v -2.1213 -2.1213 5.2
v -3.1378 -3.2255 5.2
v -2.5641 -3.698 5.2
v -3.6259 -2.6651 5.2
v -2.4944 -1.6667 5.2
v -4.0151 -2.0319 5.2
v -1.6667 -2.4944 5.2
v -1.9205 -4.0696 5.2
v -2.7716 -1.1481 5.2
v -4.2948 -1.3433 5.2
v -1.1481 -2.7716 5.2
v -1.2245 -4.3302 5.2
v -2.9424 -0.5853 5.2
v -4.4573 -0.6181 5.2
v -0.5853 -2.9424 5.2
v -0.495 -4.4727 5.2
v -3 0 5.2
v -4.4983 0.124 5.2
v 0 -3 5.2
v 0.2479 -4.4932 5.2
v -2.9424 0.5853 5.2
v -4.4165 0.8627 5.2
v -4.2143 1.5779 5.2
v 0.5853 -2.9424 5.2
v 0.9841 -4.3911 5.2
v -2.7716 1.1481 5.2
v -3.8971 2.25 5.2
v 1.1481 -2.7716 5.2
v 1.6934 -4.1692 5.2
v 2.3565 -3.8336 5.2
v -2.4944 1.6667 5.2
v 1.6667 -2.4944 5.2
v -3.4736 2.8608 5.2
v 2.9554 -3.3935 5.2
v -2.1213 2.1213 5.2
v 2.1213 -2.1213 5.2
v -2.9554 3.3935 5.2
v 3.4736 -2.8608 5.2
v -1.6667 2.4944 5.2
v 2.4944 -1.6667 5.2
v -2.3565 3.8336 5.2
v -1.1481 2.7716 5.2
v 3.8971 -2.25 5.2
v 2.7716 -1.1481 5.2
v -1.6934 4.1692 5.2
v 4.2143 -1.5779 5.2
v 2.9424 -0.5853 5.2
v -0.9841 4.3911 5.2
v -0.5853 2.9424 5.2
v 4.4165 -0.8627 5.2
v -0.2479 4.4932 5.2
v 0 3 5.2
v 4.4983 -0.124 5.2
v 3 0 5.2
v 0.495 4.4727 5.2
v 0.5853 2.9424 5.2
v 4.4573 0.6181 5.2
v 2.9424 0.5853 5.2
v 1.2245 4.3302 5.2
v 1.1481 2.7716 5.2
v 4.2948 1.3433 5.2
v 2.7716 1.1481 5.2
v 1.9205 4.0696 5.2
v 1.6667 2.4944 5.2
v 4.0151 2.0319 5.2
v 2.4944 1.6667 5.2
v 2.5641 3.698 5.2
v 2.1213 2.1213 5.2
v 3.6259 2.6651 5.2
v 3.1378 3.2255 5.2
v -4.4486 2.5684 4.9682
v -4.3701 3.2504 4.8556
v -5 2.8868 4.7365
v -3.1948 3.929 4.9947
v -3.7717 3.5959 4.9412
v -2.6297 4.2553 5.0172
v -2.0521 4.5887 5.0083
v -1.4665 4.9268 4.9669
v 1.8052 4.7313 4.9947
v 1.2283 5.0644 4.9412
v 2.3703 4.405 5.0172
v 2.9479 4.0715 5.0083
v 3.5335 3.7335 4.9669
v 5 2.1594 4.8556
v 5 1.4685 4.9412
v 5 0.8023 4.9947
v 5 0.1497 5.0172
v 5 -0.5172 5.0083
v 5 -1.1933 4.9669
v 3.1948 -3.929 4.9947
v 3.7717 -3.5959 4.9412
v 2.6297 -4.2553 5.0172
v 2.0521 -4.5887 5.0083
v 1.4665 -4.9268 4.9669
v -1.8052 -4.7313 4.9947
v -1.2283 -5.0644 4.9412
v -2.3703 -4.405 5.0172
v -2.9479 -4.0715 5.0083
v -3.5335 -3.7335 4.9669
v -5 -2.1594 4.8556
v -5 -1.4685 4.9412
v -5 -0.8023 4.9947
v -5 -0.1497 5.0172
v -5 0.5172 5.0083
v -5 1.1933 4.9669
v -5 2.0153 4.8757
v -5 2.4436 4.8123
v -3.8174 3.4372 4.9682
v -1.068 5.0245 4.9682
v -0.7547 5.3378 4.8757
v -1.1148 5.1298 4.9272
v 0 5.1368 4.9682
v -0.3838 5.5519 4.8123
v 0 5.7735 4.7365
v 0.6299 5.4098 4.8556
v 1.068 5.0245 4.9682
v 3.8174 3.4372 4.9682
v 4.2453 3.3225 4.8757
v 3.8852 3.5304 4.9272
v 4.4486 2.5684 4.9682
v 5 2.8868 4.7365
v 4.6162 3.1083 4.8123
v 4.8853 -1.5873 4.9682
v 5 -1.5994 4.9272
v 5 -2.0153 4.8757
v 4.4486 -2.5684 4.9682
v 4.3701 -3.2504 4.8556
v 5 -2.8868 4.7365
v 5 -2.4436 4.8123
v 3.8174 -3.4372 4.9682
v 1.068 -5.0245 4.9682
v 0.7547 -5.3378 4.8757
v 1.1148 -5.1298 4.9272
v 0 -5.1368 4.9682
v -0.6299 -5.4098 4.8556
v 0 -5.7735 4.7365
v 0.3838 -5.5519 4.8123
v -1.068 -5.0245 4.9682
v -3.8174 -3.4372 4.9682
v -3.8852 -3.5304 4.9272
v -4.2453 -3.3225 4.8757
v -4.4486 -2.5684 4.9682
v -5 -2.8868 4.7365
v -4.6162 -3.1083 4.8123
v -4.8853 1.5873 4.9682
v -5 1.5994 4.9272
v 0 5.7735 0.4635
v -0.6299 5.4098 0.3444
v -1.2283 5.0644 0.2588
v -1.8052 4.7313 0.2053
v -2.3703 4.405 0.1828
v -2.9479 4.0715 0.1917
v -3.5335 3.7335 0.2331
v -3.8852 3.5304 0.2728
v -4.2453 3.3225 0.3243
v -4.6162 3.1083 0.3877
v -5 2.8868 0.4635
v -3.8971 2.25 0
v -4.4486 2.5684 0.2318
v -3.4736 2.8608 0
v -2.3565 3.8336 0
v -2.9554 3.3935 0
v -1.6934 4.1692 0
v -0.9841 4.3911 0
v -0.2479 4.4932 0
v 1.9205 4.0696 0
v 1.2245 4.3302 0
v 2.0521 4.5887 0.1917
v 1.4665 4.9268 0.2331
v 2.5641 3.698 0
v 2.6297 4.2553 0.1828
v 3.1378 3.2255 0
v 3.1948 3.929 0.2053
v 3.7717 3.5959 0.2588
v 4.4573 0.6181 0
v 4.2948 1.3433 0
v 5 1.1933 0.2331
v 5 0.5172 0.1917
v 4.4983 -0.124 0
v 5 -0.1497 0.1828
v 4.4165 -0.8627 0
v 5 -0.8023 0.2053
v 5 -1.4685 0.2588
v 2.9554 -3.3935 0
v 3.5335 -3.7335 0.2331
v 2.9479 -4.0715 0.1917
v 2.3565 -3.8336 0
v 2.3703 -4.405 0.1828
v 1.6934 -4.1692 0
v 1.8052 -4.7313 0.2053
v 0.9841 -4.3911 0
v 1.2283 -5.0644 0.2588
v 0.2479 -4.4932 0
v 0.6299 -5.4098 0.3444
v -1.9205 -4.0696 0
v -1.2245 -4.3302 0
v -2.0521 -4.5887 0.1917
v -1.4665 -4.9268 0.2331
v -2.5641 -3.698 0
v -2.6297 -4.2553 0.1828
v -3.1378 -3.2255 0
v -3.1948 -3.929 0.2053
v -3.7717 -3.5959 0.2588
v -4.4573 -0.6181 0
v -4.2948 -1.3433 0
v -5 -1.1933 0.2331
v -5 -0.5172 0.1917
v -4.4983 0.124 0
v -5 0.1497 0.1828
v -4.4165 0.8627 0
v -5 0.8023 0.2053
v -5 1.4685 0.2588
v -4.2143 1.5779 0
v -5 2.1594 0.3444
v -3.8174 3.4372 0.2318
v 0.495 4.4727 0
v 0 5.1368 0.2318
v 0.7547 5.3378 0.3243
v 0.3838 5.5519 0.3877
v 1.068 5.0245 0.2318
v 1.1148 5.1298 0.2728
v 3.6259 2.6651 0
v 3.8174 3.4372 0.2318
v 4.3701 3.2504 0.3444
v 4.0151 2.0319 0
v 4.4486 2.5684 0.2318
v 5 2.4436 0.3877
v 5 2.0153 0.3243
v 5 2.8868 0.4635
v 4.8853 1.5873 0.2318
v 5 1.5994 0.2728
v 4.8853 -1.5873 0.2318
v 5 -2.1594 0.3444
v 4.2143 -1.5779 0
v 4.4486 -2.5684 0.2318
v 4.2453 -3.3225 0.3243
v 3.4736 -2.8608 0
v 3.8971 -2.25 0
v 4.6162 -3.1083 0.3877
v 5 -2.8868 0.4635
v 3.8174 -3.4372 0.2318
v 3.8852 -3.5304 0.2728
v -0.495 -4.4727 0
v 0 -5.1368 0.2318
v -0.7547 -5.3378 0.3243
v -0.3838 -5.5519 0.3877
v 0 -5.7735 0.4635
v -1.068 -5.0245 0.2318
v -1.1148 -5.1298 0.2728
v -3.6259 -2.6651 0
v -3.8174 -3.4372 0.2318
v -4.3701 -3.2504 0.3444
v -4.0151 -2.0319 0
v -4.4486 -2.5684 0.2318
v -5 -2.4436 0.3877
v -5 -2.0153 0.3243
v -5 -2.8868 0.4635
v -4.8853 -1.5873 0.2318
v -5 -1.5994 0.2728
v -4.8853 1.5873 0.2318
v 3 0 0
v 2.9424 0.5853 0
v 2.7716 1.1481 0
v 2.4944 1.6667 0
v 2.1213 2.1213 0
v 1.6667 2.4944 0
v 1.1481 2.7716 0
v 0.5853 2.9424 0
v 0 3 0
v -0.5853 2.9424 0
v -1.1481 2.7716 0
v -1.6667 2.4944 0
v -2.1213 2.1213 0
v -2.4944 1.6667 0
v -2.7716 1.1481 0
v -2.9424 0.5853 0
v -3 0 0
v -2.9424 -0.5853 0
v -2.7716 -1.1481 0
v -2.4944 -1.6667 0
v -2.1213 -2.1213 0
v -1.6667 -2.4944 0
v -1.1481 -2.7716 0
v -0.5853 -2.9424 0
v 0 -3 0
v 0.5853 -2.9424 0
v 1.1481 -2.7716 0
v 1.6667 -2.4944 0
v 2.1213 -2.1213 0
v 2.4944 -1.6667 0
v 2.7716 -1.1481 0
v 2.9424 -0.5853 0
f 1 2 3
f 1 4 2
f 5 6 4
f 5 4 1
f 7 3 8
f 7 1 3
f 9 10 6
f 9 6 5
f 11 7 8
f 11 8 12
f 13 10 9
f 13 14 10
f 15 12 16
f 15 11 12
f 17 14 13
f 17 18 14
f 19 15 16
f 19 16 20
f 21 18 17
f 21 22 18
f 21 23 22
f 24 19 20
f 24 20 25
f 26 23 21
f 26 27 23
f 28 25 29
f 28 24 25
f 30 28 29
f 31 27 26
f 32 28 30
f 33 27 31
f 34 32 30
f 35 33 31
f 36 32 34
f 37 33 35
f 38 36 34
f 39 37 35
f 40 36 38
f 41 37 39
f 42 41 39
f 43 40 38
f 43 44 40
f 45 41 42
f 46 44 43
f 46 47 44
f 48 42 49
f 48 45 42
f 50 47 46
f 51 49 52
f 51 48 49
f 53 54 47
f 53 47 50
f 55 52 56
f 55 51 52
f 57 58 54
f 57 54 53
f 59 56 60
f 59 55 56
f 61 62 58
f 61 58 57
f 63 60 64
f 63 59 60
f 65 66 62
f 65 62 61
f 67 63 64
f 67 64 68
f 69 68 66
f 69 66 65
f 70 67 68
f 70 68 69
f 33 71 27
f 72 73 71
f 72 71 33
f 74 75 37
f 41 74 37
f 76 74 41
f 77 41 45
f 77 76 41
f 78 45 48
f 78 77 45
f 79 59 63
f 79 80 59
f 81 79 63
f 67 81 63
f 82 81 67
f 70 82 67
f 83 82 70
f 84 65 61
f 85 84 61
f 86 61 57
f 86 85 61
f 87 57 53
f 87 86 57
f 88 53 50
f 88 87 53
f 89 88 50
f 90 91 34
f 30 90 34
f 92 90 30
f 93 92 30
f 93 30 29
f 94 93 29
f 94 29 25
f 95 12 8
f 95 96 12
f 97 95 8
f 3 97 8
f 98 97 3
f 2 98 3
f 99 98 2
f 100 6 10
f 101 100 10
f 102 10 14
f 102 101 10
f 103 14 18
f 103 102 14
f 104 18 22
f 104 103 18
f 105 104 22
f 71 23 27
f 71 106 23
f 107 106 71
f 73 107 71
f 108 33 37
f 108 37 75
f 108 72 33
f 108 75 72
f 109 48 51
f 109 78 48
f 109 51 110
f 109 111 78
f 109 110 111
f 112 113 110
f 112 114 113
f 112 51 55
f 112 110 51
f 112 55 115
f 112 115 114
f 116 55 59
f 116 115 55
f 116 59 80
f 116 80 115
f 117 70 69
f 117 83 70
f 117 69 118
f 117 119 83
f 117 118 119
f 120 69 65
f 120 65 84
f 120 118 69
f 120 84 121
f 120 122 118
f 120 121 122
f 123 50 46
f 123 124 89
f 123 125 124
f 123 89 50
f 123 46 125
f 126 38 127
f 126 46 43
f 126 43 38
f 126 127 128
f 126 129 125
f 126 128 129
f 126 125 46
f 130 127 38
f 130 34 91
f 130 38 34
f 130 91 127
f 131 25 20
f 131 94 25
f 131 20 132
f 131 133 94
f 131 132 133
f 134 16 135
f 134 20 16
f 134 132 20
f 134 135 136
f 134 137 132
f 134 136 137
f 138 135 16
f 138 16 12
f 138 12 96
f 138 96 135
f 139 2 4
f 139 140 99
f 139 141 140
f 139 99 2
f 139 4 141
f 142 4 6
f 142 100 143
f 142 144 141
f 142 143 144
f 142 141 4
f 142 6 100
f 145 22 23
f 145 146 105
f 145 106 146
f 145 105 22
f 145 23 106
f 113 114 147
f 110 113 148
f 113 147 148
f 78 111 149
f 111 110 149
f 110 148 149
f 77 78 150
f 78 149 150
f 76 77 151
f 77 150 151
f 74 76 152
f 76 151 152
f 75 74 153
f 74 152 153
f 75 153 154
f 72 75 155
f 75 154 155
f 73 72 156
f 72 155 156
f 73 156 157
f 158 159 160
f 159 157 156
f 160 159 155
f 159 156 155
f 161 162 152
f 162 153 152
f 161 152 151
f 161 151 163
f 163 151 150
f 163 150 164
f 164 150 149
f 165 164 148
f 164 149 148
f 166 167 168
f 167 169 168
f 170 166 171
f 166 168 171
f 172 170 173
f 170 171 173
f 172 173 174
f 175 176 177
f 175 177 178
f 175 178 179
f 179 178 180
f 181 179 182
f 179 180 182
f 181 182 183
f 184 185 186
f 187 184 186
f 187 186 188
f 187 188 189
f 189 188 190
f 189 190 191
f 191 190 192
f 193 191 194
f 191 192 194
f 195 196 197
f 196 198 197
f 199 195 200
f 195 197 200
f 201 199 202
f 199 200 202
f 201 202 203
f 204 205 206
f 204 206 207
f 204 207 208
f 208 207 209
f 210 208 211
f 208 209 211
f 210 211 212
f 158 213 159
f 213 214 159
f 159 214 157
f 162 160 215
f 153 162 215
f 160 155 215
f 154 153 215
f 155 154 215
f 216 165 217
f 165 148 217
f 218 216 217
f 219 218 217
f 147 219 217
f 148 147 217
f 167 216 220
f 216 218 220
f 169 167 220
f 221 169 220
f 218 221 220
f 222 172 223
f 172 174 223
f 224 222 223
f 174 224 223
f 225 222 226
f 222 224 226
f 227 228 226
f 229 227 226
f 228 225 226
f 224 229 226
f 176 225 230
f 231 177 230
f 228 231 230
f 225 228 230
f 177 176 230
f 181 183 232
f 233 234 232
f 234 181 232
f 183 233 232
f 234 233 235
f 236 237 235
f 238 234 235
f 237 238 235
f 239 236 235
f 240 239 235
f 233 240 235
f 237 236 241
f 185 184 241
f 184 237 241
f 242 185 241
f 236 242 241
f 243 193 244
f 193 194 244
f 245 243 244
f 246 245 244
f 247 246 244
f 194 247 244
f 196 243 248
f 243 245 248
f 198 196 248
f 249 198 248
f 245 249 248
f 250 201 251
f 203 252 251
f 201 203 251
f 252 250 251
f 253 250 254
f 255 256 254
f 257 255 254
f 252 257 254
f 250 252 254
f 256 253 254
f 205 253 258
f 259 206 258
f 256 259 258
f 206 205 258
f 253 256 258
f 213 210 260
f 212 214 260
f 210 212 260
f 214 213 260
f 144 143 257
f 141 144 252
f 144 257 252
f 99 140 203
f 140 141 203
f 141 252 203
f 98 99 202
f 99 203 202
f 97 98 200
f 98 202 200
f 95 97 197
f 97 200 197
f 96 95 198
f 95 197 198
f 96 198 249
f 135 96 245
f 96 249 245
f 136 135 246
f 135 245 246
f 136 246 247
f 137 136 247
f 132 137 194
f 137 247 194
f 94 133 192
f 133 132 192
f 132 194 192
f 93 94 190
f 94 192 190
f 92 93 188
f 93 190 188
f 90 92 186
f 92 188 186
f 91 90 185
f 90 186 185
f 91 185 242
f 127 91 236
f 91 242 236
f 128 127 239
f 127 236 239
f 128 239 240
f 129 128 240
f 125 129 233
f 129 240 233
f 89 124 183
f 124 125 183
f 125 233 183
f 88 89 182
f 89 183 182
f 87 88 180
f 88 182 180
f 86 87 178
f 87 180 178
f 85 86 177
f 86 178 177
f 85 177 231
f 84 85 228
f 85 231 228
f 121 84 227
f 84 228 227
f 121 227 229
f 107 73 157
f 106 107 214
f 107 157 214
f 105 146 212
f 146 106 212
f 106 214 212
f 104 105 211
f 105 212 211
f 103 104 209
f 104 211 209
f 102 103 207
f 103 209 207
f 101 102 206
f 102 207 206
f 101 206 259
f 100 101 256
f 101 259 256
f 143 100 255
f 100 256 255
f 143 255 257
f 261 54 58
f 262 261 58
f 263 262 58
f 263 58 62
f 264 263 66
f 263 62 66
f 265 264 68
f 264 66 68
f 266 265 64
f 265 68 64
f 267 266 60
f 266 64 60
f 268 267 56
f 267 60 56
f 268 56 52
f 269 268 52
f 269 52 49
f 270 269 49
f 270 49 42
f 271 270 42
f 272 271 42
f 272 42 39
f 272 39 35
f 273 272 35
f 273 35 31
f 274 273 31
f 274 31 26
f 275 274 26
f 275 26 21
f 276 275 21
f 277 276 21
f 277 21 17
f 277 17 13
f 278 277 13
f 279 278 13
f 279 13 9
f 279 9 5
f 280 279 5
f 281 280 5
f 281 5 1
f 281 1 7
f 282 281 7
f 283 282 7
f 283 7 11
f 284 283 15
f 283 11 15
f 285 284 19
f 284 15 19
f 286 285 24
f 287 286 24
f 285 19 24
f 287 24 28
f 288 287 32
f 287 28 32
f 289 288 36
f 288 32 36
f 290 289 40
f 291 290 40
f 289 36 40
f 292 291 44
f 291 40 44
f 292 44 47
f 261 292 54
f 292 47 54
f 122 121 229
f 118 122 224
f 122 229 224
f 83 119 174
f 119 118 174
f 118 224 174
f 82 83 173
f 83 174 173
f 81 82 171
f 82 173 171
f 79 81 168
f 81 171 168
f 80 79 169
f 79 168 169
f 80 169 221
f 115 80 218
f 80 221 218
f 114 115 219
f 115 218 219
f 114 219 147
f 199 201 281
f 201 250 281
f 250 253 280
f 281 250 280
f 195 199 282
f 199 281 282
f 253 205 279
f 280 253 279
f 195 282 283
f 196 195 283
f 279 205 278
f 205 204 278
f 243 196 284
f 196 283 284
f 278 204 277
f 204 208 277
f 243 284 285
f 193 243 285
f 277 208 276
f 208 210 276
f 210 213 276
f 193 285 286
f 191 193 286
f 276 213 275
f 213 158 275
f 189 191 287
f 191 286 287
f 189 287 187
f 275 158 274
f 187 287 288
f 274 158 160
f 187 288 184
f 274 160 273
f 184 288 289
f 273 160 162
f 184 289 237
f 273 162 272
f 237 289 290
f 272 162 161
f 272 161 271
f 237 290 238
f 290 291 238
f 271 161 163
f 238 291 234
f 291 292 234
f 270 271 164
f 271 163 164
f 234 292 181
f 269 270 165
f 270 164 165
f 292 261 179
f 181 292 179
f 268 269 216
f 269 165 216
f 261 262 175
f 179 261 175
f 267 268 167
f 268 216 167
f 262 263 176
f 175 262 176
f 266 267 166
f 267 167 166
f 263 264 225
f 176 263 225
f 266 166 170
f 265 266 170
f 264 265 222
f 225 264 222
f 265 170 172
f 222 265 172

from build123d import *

# Parameters (mm, degrees)
EXTRUDE_1_DEPTH     = 5.2
SKETCH_5_R          = 3
CUT_EXTRUDE_1_DEPTH = 10.239769117


with BuildPart() as part:
    # 草图1 → 凸台-拉伸1 (new body)
    with BuildSketch(Plane.XY):
        Polygon((0, 5.773502692), (-5, 2.886751346), (-5, -2.886751346), (0, -5.773502692), (5, -2.886751346), (5, 2.886751346), align=None)
    extrude(amount=EXTRUDE_1_DEPTH)

    # 草图4 → 切除-旋转1 (revolve, cut)
    with BuildSketch(Plane(origin=(0, 0, 0), x_dir=(0, 0, -1), z_dir=(1, 0, 0))):
        Polygon((-5.2, -4.5), (-4.736482927, -5.773502692), (-5.2, -5.773502692), align=None)
    cut_revolve_1 = revolve(axis=Axis((0, 0, 5.2), (0, 0, -1)), mode=Mode.SUBTRACT)

    # 镜向1: 切除-旋转1 across plane
    add(cut_revolve_1.mirror(Plane.XY.offset(2.6)), mode=Mode.SUBTRACT)

    # 草图5 → 切除-拉伸1 (cut, through all)
    with BuildSketch(Plane.XY.offset(5.2)):
        Circle(SKETCH_5_R)
    extrude(amount=-CUT_EXTRUDE_1_DEPTH, mode=Mode.SUBTRACT)


solid = part.part
